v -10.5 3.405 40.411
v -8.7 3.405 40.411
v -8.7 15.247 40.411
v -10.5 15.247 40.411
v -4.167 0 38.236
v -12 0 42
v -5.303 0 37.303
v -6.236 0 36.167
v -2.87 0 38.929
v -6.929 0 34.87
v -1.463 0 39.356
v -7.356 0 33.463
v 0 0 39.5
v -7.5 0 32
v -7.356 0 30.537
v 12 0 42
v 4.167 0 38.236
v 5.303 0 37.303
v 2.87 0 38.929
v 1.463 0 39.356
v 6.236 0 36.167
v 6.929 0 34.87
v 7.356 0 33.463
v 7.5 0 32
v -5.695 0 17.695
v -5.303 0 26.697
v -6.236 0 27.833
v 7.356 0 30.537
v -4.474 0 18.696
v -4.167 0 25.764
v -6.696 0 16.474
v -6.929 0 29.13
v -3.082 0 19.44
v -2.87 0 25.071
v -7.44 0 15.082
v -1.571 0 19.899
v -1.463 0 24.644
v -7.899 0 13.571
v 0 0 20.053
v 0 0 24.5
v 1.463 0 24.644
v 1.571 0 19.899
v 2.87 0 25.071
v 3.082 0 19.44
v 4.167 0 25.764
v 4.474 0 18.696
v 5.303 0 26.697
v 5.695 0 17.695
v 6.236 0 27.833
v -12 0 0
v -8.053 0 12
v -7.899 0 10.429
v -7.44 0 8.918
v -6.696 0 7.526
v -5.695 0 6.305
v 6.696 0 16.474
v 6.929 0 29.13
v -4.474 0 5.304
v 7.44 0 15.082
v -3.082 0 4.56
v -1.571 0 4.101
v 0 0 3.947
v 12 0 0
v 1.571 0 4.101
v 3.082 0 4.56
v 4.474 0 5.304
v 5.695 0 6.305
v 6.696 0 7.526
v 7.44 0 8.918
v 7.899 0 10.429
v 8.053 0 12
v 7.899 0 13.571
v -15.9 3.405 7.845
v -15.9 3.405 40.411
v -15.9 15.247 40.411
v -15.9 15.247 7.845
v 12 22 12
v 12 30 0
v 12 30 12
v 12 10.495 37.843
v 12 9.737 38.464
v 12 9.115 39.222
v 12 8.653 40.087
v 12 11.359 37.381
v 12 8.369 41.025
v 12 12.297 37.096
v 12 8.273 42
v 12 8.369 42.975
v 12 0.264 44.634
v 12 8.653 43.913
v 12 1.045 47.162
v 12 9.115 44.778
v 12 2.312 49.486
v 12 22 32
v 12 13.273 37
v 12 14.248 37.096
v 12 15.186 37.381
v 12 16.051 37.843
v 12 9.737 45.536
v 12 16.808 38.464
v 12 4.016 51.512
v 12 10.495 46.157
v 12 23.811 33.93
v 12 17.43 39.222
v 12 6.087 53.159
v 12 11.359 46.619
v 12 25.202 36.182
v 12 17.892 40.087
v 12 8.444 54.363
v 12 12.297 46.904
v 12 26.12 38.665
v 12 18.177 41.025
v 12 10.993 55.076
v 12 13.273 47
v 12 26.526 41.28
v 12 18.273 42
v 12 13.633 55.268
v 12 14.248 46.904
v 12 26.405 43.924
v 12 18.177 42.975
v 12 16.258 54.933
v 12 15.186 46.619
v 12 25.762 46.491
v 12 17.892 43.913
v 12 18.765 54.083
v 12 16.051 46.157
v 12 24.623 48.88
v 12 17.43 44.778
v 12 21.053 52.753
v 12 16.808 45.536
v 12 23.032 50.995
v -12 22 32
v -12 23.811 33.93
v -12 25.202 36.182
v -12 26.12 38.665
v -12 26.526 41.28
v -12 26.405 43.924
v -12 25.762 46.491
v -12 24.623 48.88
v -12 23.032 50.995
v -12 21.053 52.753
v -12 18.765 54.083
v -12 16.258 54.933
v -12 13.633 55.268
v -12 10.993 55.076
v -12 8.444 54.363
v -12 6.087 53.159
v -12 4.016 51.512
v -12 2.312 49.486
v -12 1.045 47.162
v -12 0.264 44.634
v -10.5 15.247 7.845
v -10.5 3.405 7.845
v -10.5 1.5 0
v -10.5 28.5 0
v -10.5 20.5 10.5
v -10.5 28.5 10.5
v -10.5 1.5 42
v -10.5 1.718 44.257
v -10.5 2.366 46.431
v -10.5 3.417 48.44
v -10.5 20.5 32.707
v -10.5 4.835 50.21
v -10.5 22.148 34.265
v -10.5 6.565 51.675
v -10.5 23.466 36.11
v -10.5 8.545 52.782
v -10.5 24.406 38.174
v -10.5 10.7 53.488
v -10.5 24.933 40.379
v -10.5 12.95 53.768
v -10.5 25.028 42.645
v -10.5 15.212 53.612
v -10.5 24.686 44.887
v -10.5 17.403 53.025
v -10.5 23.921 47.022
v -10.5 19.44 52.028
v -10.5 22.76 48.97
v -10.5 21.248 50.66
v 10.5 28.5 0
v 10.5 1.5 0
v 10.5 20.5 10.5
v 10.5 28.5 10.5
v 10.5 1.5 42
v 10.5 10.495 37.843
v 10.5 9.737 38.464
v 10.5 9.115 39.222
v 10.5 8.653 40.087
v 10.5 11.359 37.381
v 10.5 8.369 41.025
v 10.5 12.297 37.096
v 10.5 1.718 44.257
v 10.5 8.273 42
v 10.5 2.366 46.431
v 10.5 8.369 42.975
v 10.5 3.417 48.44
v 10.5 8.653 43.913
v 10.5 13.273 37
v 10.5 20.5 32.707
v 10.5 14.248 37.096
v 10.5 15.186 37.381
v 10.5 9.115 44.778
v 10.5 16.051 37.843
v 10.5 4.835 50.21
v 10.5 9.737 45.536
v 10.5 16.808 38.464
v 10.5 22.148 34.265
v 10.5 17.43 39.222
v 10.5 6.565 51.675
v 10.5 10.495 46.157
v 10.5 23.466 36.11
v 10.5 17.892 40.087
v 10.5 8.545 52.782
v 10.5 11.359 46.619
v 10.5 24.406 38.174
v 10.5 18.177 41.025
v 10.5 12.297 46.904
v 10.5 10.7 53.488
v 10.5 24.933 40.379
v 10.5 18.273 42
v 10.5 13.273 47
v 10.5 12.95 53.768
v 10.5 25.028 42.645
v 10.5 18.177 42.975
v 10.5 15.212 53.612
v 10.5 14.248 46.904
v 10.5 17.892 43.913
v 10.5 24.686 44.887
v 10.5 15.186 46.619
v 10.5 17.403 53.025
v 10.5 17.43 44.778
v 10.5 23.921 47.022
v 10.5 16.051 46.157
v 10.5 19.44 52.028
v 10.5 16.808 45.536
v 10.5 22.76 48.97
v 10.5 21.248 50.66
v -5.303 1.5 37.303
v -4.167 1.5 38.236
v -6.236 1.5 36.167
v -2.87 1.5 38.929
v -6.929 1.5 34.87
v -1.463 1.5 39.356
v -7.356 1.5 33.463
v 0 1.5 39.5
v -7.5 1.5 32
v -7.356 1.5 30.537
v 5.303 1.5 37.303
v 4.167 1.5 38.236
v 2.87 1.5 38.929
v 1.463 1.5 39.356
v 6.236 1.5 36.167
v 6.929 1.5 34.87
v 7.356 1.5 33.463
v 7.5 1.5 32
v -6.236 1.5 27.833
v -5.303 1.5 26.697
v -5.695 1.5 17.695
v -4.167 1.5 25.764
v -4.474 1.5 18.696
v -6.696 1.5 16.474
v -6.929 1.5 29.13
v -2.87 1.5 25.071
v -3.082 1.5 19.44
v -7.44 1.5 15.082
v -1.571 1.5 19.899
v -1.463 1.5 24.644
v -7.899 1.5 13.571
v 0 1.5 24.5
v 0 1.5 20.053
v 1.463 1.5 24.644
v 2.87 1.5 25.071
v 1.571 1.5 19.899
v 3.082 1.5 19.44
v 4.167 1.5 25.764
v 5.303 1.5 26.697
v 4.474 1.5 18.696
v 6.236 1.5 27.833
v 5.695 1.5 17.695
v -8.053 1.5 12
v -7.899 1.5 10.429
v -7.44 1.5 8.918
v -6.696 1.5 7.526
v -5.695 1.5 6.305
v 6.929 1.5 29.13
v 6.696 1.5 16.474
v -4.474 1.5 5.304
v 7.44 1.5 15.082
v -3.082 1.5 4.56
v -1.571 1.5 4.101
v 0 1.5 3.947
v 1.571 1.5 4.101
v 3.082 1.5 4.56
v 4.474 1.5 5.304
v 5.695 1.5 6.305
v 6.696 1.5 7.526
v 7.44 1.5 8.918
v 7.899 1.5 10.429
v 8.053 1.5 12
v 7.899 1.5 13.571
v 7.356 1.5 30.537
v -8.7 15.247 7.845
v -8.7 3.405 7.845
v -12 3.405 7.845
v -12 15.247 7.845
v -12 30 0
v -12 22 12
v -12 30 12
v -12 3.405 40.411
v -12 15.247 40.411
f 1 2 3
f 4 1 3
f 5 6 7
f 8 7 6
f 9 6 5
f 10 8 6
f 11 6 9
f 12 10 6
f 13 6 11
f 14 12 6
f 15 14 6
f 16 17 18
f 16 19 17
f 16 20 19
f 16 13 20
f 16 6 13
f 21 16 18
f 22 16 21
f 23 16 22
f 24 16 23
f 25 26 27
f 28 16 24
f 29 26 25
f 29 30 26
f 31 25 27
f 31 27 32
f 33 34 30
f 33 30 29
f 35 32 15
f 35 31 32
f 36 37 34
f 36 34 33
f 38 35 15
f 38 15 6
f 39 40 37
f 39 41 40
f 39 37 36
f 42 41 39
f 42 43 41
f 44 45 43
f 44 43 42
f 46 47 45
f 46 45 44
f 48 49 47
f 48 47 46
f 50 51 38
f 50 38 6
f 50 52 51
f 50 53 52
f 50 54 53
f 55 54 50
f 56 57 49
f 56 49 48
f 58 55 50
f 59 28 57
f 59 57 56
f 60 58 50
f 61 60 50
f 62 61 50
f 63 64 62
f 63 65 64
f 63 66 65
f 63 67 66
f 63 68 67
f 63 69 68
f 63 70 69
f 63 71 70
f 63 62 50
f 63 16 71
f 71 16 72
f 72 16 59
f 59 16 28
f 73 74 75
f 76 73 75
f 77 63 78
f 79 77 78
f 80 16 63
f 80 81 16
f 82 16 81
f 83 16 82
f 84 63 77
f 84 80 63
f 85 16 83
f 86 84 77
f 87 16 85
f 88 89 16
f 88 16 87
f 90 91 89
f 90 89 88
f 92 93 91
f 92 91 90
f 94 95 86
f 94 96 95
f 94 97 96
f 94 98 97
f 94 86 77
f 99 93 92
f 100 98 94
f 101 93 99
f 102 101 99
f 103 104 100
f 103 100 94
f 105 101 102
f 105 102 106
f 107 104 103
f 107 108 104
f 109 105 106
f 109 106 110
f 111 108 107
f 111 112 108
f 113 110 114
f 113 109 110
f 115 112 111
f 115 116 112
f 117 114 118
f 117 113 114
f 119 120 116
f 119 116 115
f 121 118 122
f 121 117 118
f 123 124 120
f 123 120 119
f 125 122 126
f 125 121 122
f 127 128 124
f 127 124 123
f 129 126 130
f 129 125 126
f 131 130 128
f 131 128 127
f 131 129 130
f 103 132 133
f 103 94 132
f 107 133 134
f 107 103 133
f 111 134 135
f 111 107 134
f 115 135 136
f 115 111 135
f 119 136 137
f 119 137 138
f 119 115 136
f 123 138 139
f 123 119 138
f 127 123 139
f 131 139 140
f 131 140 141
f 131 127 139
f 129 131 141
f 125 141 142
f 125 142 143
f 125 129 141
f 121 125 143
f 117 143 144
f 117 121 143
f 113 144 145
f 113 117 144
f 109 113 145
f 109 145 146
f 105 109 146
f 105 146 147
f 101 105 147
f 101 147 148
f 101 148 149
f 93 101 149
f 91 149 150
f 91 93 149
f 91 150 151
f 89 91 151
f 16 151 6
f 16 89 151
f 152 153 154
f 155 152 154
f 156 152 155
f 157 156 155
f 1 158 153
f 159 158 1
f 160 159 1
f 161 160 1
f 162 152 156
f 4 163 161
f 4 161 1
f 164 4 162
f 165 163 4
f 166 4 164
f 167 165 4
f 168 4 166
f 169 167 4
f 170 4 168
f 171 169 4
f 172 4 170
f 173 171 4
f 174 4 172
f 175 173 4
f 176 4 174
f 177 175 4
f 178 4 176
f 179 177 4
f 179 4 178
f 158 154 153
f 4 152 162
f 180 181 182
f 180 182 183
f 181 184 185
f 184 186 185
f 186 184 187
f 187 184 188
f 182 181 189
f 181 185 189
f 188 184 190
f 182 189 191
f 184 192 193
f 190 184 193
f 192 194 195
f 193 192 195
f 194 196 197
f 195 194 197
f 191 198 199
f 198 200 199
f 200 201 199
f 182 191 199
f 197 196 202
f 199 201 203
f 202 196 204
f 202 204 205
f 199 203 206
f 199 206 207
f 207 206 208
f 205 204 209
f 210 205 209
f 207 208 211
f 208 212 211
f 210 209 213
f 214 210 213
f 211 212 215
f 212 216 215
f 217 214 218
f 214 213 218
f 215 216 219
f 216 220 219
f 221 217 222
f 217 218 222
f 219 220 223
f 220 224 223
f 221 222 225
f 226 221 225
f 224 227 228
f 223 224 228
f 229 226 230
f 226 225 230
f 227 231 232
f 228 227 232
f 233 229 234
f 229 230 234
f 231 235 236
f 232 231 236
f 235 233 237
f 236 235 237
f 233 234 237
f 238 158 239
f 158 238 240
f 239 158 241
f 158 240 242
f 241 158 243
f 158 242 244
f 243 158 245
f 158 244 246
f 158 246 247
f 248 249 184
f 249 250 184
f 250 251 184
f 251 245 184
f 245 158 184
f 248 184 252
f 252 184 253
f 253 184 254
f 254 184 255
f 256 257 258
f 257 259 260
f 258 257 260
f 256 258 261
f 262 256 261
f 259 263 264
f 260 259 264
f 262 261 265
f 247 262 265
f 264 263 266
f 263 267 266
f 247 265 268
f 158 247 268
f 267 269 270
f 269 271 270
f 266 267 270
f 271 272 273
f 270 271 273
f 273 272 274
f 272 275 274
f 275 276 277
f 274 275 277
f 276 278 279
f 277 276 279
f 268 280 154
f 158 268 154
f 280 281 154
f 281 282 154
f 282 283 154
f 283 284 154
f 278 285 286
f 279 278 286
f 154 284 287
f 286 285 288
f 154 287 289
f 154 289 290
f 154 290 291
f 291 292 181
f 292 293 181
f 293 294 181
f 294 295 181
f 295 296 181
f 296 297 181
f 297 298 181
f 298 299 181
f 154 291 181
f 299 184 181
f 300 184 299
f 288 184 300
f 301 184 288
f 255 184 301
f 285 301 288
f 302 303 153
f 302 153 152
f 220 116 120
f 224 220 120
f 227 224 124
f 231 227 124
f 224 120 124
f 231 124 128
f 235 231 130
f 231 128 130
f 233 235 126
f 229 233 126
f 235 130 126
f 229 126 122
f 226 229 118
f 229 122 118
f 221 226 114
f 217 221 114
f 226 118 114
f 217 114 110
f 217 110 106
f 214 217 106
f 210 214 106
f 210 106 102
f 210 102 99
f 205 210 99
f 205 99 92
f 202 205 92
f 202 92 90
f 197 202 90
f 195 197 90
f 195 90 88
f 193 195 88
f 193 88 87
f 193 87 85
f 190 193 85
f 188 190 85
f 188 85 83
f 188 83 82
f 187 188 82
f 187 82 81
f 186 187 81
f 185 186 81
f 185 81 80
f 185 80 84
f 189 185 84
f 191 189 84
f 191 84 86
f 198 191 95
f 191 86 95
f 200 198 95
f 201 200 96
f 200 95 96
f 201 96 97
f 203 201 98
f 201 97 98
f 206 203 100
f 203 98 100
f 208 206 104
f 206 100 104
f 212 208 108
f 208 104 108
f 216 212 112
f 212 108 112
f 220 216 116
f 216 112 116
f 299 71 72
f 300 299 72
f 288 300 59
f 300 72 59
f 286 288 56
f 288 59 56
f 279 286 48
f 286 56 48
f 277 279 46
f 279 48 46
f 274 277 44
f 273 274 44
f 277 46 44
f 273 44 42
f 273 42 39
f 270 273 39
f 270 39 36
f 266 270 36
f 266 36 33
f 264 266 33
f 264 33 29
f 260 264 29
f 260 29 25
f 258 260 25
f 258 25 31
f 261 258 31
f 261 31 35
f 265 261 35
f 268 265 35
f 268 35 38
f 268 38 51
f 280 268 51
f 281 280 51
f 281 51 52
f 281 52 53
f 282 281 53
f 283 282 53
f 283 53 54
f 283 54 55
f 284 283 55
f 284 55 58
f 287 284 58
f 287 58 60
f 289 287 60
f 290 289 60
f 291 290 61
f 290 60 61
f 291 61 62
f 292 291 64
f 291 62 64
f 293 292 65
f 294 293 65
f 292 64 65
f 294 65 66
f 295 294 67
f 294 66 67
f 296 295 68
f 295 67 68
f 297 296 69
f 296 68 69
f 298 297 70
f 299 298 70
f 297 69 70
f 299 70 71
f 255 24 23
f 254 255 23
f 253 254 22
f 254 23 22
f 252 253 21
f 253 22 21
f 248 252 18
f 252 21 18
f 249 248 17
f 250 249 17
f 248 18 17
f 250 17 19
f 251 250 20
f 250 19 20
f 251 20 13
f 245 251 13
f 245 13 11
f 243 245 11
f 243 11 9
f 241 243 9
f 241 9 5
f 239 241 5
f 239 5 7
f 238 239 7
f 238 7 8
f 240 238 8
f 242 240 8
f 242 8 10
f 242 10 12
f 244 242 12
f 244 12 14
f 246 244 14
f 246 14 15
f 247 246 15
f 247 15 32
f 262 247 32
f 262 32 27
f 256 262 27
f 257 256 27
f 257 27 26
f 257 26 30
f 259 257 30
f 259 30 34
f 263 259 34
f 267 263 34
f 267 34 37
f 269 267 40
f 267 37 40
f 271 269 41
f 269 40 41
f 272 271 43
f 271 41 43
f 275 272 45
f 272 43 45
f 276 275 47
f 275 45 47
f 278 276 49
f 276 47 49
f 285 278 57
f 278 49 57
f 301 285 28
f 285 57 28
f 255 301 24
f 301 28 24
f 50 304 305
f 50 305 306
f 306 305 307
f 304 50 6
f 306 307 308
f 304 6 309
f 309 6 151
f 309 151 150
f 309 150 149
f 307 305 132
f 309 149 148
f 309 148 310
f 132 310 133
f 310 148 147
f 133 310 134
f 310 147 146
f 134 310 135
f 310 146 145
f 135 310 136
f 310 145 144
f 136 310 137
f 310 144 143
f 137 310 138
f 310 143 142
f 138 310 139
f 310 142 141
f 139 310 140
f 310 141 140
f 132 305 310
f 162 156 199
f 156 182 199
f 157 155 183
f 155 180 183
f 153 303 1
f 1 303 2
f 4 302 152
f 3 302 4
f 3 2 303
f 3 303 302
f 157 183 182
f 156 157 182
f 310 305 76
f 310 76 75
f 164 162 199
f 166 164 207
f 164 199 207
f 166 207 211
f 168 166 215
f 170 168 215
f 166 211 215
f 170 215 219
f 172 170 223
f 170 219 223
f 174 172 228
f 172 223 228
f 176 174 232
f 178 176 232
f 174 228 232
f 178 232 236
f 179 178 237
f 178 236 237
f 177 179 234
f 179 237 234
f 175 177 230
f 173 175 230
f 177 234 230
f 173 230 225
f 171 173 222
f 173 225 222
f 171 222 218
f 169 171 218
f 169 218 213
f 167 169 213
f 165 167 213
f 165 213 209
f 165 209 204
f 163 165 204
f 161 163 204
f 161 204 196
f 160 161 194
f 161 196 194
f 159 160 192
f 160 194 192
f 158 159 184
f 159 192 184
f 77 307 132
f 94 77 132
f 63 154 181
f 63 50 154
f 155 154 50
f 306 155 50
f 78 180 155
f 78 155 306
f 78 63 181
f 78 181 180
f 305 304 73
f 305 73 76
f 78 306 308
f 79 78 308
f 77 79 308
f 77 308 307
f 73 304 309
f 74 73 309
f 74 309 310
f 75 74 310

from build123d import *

# Parameters (mm, degrees)
F1_DEPTH  = 12
F2_T      = -1.5
F3_R      = 5
F4_DEPTH  = 5
F5_R      = 7.5
F5_R_2    = 8.0533004945
F6_DEPTH  = 5
F10_START = -8.7
F9_W      = 11.8421060033
F9_H      = 32.5657902285
F10_DEPTH = 7.2


with BuildPart() as f1:
    # F0 (on Right) → F1 (new body, symmetric)
    with BuildSketch(Plane.YZ):
        with BuildLine():
            Line((0, 42), (0, 0))
            Line((0, 0), (30, 0))
            Line((30, 0), (30, 12))
            Line((30, 12), (22, 12))
            Line((22, 12), (22, 32))
            ThreePointArc((22, 32), (18.7650208971, 54.0830459736), (0, 42))
        make_face()
    extrude(amount=F1_DEPTH, both=True)

    # F2
    f2_openings = [f1.faces().sort_by_distance(p)[0] for p in [
        (0, 15, 0),
    ]]
    offset(amount=F2_T, openings=f2_openings, kind=Kind.INTERSECTION)

    # F3 (on face) → F4 (cut)
    with BuildSketch(Plane.YZ.offset(12)):
        with Locations((13.2727272727, 42)):
            Circle(F3_R)
    extrude(amount=-F4_DEPTH, mode=Mode.SUBTRACT)

    # F5 (on face) → F6 (cut)
    with BuildSketch(Plane.XZ):
        with Locations((0, 32)):
            Circle(F5_R)
        with Locations((0, 12)):
            Circle(F5_R_2)
    extrude(amount=-F6_DEPTH, mode=Mode.SUBTRACT)


with BuildPart() as f7_1:
    # F7: instance of F1
    add(f1.part.mirror(Plane(origin=(12, 12.8367440459, 24.8577602778), x_dir=(0, 1, 0), z_dir=(1, 0, 0))))


with BuildPart() as f1_1:
    add(f1.part)

    # F9 (on Right) → F10 (join)
    with BuildSketch(Plane.YZ.offset(F10_START)):
        with Locations((9.3256586697, 24.1282903589)):
            Rectangle(F9_W, F9_H)
    extrude(amount=-F10_DEPTH)


solid = f1_1.part
